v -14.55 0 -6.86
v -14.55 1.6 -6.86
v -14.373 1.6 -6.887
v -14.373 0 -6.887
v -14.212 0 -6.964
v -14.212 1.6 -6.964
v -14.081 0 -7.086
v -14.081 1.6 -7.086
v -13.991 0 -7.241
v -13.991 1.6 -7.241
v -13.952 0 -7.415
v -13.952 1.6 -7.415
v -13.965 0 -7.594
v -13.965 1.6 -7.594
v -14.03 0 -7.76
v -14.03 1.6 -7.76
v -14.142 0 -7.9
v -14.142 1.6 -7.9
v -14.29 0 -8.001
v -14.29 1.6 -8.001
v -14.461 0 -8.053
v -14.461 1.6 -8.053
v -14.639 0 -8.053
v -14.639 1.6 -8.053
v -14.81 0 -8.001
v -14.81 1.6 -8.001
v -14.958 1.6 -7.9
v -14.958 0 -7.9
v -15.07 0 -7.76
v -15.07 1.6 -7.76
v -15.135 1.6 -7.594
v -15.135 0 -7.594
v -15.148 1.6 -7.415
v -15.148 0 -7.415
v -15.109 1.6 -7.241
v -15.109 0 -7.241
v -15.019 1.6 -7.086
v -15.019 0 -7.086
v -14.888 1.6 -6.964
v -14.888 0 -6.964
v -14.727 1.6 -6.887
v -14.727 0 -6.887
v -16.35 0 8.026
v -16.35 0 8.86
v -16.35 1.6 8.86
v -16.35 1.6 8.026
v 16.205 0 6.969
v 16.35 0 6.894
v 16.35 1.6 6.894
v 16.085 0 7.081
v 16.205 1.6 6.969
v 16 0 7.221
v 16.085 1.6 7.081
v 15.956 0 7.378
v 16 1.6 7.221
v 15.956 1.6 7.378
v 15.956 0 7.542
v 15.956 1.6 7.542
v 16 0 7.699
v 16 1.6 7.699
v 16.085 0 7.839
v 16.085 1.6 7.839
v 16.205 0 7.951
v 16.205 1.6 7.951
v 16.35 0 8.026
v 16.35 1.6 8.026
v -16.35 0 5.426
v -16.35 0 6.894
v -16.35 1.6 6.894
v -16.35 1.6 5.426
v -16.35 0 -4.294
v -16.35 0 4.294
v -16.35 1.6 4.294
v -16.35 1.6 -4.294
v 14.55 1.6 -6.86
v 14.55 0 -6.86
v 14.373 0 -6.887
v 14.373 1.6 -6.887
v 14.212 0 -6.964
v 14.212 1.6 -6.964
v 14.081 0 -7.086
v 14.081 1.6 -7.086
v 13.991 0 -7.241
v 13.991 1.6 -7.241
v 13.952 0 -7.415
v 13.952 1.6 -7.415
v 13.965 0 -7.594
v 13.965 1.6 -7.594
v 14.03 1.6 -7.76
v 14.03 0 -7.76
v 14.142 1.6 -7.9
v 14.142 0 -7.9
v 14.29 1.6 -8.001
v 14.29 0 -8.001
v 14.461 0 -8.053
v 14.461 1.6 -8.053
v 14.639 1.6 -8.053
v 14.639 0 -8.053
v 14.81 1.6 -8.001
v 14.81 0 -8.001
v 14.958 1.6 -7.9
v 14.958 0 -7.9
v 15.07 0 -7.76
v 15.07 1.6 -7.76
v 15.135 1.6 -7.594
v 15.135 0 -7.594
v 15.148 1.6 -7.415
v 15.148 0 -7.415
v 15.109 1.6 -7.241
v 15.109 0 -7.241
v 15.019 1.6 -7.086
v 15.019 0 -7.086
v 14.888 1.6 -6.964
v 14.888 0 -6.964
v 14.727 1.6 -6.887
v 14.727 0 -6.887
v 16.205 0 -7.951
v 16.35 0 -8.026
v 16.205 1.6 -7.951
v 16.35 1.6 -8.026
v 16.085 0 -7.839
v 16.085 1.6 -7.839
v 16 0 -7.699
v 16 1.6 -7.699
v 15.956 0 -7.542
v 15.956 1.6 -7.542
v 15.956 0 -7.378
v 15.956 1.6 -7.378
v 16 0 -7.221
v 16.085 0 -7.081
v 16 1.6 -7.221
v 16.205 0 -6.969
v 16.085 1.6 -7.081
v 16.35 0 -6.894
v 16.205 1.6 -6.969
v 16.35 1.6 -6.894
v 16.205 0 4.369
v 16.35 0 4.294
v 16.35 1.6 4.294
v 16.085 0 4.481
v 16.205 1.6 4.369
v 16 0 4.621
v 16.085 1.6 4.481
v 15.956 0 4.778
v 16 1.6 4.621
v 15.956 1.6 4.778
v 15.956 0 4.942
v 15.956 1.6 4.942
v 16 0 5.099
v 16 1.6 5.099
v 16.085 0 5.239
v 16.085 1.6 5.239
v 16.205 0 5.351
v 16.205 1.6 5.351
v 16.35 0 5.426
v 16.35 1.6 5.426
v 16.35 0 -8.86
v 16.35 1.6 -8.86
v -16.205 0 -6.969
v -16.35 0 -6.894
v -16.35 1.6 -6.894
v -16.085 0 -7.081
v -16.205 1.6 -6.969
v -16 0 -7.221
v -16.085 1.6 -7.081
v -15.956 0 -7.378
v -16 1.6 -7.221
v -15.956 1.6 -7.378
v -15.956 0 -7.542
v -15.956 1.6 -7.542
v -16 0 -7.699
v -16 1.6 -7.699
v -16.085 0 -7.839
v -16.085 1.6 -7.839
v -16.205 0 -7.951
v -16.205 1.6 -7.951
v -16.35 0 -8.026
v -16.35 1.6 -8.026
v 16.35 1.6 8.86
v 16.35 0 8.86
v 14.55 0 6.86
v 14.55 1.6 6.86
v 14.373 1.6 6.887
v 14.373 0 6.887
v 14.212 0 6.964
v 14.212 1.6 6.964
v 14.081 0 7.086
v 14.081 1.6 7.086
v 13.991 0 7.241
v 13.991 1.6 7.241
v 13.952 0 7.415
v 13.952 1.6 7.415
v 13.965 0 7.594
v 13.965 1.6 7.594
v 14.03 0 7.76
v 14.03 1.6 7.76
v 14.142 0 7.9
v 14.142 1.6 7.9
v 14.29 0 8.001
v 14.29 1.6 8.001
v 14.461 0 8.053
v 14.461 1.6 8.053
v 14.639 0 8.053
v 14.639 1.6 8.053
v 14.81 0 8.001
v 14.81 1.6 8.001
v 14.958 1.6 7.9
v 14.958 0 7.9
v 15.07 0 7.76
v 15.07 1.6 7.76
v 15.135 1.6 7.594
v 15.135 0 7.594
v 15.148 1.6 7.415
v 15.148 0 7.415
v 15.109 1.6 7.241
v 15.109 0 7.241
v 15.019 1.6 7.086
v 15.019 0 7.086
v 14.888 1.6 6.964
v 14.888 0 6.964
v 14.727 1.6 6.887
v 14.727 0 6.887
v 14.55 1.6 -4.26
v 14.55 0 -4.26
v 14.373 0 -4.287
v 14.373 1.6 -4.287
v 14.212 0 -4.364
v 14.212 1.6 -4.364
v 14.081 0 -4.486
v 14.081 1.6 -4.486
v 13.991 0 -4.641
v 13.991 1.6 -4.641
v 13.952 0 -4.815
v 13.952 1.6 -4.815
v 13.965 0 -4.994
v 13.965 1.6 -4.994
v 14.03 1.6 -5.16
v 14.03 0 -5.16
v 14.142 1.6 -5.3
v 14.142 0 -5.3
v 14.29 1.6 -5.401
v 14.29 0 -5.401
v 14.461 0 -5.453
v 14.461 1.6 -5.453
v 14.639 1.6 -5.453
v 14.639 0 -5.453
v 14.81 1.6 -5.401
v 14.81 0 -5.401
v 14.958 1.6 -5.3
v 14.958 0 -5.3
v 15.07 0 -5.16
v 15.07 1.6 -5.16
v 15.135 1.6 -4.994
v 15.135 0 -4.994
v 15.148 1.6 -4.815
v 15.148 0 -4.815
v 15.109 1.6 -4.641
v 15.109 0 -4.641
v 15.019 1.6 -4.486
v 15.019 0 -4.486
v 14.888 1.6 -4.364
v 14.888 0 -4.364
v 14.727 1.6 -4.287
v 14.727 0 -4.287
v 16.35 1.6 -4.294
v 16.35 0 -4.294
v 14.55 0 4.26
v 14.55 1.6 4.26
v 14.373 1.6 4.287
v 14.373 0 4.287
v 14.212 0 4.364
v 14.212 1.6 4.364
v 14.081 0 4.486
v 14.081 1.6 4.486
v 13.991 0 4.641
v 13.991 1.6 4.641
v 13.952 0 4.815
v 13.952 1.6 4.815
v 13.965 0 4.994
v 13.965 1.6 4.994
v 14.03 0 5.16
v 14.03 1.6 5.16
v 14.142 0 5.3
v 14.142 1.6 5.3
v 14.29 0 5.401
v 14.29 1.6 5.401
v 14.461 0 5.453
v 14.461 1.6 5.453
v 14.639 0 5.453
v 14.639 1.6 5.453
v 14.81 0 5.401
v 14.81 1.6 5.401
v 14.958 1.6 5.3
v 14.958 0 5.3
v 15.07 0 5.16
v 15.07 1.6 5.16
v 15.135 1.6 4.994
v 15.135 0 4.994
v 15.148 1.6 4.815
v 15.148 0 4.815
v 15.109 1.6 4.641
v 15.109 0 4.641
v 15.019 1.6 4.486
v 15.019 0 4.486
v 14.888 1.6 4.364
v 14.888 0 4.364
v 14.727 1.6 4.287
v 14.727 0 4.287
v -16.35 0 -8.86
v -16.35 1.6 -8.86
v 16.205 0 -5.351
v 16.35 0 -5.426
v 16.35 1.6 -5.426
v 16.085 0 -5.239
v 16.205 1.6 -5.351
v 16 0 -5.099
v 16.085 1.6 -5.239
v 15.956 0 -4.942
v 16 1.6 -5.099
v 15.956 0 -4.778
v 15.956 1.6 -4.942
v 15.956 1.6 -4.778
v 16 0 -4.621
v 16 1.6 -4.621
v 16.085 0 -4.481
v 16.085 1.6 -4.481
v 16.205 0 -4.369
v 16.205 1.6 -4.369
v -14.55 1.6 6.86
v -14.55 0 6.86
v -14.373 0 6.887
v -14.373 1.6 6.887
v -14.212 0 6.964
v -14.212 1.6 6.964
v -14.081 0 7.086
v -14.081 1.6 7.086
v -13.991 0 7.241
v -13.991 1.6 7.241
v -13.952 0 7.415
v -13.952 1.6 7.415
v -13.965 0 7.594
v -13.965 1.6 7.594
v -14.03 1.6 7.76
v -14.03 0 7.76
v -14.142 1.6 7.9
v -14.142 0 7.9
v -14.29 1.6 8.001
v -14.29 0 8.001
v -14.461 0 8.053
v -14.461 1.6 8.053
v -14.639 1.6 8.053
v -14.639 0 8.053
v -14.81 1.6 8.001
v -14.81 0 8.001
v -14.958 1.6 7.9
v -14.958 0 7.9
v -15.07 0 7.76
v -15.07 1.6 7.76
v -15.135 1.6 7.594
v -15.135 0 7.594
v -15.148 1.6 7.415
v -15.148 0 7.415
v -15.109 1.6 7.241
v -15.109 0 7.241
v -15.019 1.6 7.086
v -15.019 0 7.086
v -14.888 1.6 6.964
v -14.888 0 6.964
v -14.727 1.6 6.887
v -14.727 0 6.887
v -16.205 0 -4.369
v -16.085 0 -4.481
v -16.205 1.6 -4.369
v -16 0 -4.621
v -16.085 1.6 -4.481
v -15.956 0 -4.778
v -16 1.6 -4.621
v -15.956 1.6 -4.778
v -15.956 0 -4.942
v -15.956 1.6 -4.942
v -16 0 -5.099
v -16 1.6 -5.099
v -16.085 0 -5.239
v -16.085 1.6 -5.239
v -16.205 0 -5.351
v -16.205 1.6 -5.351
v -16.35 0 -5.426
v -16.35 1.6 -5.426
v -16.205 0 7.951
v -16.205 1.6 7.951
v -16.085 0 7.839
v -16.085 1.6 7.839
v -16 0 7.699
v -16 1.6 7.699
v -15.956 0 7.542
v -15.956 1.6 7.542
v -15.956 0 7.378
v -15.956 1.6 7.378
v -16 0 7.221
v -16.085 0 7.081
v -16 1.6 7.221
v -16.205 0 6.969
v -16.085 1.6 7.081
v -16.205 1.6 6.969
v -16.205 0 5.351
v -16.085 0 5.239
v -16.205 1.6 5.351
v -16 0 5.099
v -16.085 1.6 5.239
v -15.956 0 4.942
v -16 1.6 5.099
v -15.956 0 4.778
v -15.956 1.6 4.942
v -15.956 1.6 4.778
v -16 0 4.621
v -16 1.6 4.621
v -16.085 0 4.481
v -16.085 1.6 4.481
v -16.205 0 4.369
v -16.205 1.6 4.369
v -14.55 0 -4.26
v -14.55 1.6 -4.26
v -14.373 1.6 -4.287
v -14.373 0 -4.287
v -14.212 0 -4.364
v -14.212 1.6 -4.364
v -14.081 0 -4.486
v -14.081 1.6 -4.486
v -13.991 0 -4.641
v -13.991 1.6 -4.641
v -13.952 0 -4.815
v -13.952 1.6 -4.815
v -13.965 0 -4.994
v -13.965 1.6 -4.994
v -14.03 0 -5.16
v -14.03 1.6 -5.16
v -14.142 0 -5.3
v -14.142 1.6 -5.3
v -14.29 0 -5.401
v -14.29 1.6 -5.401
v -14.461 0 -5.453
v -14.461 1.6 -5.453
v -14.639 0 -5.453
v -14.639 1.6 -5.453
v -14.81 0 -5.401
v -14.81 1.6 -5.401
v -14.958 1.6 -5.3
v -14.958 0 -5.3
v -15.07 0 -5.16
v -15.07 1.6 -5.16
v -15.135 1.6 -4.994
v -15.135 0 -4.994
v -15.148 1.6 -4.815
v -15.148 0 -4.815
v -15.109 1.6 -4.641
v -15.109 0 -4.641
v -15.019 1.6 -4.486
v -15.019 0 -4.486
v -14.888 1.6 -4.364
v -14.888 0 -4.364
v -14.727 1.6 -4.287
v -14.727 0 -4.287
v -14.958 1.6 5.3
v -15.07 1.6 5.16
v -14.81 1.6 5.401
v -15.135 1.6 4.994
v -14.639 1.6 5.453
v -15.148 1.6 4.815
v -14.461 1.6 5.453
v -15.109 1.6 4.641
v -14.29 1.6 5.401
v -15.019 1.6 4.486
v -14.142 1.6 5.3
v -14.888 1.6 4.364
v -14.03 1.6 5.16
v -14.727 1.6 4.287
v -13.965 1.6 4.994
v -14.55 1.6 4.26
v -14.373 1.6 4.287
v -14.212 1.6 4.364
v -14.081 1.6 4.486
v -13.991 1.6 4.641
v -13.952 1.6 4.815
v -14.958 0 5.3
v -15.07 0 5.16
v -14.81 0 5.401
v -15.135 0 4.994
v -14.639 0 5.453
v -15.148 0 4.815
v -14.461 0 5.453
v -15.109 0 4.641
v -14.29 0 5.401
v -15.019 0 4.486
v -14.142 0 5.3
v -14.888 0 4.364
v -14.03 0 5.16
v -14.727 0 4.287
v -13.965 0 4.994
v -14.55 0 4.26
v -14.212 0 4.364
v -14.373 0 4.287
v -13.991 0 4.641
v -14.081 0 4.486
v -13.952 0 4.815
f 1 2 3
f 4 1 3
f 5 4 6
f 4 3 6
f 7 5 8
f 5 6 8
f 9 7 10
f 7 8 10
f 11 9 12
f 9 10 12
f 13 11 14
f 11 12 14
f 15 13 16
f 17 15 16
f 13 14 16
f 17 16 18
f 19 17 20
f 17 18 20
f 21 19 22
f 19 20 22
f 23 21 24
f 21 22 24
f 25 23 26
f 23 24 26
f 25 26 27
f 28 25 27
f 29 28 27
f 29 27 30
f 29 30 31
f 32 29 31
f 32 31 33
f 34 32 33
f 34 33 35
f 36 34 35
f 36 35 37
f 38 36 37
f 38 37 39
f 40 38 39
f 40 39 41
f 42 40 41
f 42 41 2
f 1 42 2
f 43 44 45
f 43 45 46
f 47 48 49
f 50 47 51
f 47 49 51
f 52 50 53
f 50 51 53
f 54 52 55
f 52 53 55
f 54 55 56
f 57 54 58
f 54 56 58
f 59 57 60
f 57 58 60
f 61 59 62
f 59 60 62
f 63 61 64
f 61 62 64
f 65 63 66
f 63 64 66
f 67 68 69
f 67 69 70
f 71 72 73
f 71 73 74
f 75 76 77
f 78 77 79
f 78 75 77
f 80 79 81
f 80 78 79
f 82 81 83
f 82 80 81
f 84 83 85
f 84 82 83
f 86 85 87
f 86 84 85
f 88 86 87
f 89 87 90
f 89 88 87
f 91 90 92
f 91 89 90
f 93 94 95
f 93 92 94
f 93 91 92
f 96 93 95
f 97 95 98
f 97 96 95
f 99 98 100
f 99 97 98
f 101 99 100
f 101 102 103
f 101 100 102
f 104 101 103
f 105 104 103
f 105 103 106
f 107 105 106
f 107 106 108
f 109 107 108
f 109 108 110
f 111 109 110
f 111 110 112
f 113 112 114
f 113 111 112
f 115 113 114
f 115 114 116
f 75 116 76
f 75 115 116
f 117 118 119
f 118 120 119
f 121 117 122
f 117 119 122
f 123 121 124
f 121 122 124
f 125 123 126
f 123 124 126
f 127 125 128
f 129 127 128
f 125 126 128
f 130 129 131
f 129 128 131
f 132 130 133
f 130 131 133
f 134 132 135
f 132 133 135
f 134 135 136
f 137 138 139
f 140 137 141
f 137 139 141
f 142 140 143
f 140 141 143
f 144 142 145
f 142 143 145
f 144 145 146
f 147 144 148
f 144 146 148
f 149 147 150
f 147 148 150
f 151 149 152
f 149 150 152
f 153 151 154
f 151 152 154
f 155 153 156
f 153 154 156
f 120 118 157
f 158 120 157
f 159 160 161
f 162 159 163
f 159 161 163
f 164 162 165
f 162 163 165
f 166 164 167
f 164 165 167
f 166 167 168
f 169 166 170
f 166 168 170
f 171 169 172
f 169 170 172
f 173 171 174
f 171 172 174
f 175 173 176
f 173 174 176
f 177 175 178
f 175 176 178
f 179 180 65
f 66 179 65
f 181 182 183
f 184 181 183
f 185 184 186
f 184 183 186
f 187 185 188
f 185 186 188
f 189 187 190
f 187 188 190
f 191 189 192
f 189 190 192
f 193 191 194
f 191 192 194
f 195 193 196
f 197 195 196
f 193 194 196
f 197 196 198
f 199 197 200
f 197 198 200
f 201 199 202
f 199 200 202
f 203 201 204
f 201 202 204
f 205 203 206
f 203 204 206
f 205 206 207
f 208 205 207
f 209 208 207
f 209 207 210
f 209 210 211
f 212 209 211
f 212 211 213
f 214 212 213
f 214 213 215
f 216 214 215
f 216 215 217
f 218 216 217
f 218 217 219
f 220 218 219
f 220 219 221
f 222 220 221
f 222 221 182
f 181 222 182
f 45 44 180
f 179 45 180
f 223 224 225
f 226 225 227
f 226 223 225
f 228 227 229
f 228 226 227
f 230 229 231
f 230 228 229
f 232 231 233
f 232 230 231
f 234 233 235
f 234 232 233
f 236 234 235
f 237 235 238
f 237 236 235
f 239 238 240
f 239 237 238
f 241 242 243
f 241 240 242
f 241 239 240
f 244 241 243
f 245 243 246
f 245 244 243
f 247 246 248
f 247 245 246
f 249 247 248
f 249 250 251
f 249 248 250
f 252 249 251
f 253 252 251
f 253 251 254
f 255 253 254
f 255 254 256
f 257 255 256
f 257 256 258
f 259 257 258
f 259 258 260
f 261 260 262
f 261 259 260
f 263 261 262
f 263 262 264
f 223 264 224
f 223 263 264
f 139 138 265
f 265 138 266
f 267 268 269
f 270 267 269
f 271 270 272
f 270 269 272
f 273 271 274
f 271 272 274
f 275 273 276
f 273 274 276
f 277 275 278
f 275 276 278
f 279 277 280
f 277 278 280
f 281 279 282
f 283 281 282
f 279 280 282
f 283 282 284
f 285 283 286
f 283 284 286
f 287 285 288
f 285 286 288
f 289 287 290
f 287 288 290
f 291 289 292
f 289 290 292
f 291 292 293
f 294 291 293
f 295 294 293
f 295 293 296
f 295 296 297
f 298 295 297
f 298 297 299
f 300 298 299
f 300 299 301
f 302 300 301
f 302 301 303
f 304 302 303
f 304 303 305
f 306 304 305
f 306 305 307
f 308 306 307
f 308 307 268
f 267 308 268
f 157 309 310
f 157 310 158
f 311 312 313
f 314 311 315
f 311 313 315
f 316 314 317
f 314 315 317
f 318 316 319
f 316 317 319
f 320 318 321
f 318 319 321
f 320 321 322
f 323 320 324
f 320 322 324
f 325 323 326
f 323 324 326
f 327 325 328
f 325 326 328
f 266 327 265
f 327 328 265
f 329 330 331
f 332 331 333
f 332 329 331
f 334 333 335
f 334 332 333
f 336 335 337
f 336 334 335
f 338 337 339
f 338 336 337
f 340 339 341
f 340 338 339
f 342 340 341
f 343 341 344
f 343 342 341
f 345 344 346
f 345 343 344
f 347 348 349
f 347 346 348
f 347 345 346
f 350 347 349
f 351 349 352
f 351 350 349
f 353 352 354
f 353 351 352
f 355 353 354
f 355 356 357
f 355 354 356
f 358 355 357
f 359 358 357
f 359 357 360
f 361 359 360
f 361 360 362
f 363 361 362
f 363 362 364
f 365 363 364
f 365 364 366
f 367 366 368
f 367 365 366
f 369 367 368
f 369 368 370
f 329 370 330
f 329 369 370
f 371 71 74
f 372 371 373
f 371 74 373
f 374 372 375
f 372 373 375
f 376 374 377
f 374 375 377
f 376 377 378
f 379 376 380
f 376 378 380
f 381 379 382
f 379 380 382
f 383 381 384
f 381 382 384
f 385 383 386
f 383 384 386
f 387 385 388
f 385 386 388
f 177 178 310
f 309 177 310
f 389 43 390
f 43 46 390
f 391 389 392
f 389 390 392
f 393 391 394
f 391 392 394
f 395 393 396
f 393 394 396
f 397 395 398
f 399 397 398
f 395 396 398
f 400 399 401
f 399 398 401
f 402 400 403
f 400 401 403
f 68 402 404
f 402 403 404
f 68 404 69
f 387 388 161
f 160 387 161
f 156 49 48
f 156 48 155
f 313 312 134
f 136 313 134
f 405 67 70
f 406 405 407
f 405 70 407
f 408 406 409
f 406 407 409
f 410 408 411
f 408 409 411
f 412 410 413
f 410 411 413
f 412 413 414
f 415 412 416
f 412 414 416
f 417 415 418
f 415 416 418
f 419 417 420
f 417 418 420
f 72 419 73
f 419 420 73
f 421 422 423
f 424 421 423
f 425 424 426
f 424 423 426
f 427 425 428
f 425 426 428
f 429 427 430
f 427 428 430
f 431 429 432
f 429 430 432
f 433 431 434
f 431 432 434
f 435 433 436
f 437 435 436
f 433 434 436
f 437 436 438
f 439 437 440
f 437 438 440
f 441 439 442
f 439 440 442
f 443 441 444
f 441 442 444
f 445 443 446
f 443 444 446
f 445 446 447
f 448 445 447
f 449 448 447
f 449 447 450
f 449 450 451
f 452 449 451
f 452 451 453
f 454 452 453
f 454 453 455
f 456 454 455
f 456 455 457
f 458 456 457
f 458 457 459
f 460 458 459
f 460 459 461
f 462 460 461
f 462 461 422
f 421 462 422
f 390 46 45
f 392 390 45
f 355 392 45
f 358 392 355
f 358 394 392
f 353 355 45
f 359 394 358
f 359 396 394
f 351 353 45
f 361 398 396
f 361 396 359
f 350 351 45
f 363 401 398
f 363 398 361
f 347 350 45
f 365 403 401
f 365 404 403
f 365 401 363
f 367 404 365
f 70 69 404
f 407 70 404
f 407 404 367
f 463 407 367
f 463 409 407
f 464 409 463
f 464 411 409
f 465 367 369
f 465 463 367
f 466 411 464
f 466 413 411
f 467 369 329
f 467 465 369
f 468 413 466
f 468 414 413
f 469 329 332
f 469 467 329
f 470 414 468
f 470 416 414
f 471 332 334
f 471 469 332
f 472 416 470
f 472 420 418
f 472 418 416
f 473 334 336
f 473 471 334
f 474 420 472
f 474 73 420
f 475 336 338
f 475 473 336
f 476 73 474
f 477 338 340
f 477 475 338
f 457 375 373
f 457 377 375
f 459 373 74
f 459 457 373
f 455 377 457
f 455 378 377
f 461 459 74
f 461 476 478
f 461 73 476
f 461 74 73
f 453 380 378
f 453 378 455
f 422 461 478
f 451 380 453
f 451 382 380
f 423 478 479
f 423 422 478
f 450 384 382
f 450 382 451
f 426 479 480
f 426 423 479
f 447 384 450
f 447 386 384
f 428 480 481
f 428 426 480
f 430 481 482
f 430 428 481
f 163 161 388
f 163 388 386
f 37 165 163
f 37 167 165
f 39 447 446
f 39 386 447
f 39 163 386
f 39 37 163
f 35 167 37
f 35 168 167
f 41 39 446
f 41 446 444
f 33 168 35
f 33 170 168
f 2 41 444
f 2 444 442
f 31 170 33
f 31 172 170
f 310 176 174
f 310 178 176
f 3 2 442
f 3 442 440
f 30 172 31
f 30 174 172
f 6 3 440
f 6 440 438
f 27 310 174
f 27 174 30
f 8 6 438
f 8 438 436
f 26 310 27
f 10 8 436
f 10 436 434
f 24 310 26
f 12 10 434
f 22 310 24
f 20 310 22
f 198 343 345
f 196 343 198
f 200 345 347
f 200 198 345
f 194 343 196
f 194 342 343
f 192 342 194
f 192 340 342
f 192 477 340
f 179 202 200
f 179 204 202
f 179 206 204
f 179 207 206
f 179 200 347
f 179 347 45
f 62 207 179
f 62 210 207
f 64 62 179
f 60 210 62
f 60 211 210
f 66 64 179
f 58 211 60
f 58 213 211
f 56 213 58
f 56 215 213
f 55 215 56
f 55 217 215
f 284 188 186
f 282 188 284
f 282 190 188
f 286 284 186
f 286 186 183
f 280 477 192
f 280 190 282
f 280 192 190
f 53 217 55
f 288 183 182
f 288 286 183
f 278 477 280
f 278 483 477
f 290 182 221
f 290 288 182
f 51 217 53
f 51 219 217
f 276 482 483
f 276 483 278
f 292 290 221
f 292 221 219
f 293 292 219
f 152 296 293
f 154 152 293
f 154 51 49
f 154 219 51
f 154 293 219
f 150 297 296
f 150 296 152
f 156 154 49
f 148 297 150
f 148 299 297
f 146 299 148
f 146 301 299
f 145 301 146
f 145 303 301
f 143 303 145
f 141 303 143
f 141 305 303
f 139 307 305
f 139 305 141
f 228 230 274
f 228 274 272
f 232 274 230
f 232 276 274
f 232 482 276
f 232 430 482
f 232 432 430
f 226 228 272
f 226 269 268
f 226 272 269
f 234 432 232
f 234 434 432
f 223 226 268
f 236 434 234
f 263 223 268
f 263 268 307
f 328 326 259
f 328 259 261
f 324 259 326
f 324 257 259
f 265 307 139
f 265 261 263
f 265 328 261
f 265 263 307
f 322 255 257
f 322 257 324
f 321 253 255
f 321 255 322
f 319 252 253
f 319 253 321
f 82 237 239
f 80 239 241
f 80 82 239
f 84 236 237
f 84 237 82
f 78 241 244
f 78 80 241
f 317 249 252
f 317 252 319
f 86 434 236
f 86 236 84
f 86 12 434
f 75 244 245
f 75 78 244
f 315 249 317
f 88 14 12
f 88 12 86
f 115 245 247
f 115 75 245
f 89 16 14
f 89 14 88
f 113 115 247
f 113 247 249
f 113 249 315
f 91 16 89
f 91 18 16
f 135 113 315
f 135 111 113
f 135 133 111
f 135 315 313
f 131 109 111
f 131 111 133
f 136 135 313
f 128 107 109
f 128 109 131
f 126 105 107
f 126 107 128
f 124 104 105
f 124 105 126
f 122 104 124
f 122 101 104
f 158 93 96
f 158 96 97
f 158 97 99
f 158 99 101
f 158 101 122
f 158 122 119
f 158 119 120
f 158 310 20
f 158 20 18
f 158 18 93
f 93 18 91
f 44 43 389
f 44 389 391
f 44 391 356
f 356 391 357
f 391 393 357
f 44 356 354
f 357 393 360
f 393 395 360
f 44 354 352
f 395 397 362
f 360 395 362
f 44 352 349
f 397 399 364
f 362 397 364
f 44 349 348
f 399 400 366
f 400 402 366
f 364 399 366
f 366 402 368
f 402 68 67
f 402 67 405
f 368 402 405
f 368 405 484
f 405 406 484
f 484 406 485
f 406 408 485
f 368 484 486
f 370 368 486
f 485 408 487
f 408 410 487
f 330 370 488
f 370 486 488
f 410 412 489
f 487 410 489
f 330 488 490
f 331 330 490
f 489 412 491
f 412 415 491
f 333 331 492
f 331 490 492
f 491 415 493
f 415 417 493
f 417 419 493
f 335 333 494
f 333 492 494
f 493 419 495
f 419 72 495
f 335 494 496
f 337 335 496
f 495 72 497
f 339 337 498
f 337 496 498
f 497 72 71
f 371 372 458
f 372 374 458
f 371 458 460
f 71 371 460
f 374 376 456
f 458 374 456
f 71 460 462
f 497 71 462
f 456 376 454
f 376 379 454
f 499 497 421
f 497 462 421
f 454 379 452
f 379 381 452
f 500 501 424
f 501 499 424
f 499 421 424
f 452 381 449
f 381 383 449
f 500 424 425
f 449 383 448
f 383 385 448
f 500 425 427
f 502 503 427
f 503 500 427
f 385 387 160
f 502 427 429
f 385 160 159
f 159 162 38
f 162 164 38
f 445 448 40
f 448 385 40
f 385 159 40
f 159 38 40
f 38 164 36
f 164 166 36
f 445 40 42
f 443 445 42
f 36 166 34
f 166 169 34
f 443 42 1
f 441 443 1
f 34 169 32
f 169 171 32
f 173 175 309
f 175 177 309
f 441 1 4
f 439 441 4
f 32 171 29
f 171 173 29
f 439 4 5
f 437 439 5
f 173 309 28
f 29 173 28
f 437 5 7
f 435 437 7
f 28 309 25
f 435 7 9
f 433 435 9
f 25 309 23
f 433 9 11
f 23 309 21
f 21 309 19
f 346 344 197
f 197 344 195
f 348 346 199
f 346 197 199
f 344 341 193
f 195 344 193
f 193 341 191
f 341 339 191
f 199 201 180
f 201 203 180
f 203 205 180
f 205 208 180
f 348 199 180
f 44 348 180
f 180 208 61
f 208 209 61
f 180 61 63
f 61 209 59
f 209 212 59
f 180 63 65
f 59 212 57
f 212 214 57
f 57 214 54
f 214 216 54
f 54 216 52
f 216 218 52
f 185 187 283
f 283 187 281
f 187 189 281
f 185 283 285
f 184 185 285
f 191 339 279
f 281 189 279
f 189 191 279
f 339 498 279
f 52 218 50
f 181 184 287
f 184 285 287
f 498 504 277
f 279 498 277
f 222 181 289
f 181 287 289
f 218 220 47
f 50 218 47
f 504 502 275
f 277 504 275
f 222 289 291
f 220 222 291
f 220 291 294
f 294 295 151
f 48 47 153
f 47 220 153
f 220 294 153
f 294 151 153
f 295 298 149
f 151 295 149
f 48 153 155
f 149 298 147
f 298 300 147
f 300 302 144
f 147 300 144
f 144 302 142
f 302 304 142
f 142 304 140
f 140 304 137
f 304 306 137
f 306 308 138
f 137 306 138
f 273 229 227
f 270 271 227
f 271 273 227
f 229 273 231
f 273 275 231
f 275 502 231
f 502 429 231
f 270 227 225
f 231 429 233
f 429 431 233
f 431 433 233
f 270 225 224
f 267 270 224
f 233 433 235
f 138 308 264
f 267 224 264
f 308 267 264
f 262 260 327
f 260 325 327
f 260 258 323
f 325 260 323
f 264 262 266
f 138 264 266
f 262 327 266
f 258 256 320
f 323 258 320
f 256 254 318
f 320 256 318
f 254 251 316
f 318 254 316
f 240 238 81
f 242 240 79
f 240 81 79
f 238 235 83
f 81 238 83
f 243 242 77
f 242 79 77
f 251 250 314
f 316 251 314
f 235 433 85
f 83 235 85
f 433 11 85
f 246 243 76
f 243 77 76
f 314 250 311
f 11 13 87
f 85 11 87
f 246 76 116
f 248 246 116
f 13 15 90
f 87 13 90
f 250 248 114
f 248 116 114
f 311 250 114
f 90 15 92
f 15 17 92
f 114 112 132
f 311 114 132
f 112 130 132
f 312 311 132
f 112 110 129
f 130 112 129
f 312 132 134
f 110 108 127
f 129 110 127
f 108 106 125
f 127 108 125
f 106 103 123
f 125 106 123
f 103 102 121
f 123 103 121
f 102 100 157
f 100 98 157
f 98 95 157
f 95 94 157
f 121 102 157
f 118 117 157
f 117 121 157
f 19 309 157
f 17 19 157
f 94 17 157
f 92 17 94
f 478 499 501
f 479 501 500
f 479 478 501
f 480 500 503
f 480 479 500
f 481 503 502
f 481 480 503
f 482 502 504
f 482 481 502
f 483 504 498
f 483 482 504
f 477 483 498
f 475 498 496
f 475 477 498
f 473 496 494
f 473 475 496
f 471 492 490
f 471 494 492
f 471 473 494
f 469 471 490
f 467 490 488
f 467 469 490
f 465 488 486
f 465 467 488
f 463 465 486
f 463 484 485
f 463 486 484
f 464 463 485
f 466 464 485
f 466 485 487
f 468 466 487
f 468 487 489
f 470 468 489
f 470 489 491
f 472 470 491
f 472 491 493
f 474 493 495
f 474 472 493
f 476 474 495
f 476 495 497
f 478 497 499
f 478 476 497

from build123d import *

# Parameters (mm, degrees)
SKETCH1_W                       = 32.7
SKETCH1_H                       = 17.72
MAIN_BODY_DEPTH                 = 1.6
SKETCH2_R                       = 0.6
SOLDERED_CONNECTION_HOLES_DEPTH = 19.664996651
LPATTERN1_COUNT                 = 2
LPATTERN1_PITCH                 = 2
MIRROR1_COPY_1_SKETCH_R         = 0.6
MIRROR1_COPY_1_DEPTH            = 19.664996651
MIRROR2_COPY_1_SKETCH_R         = 0.6
MIRROR2_COPY_1_DEPTH            = 19.664996651
MIRROR2_COPY_2_SKETCH_R         = 0.6
MIRROR2_COPY_2_DEPTH            = 19.664996651
MIRROR2_COPY_3_SKETCH_R         = 0.6
MIRROR2_COPY_3_DEPTH            = 19.664996651


with BuildPart() as part:
    # Sketch1 → MAIN BODY (new body)
    with BuildSketch(Plane(origin=(0, 0, 0), x_dir=(1, 0, 0), z_dir=(0, 1, 0))):
        Rectangle(SKETCH1_W, SKETCH1_H)
    extrude(amount=MAIN_BODY_DEPTH)

    # Sketch2 → SOLDERED CONNECTION HOLES (cut, through all)
    with BuildSketch(Plane(origin=(0, 1.6, 0), x_dir=(1, 0, 0), z_dir=(0, 1, 0))):
        with Locations(Location((-14.55, 7.46, 0), (0, 0, 270))):
            Circle(SKETCH2_R)
        with Locations(Location((-14.55, 4.86, 0), (0, 0, 270))):
            Circle(SKETCH2_R)
    soldered_connection_holes = extrude(amount=-SOLDERED_CONNECTION_HOLES_DEPTH, mode=Mode.SUBTRACT)

    # LPattern1: SOLDERED CONNECTION HOLES ×2
    with Locations(*[(-i * LPATTERN1_PITCH, 0, 0) for i in range(1, LPATTERN1_COUNT)]):
        add(soldered_connection_holes, mode=Mode.SUBTRACT)

    # Mirror1: SOLDERED CONNECTION HOLES across plane
    add(soldered_connection_holes.mirror(Plane(origin=(0, 0, 0), x_dir=(0, 0, 1), z_dir=(1, 0, 0))), mode=Mode.SUBTRACT)

    # Mirror1 copy 1 sketch → Mirror1 copy 1 (cut, through all)
    with BuildSketch(Plane(origin=(2, 1.6, 0), x_dir=(-1, 0, 0), z_dir=(0, 1, 0))):
        with Locations((-14.55, -7.46)):
            Circle(MIRROR1_COPY_1_SKETCH_R)
        with Locations((-14.55, -4.86)):
            Circle(MIRROR1_COPY_1_SKETCH_R)
    extrude(amount=-MIRROR1_COPY_1_DEPTH, mode=Mode.SUBTRACT)

    # Mirror2: SOLDERED CONNECTION HOLES across plane
    add(soldered_connection_holes.mirror(Plane.XY), mode=Mode.SUBTRACT)

    # Mirror2 copy 1 sketch → Mirror2 copy 1 (cut, through all)
    with BuildSketch(Plane(origin=(-2, 1.6, 0), x_dir=(1, 0, 0), z_dir=(0, 1, 0))):
        with Locations((-14.55, -7.46)):
            Circle(MIRROR2_COPY_1_SKETCH_R)
        with Locations((-14.55, -4.86)):
            Circle(MIRROR2_COPY_1_SKETCH_R)
    extrude(amount=-MIRROR2_COPY_1_DEPTH, mode=Mode.SUBTRACT)

    # Mirror2 copy 2 sketch → Mirror2 copy 2 (cut, through all)
    with BuildSketch(Plane(origin=(0, 1.6, 0), x_dir=(-1, 0, 0), z_dir=(0, 1, 0))):
        with Locations(Location((-14.55, 7.46, 0), (0, 0, 270))):
            Circle(MIRROR2_COPY_2_SKETCH_R)
        with Locations(Location((-14.55, 4.86, 0), (0, 0, 270))):
            Circle(MIRROR2_COPY_2_SKETCH_R)
    extrude(amount=-MIRROR2_COPY_2_DEPTH, mode=Mode.SUBTRACT)

    # Mirror2 copy 3 sketch → Mirror2 copy 3 (cut, through all)
    with BuildSketch(Plane(origin=(2, 1.6, 0), x_dir=(-1, 0, 0), z_dir=(0, 1, 0))):
        with Locations(Location((-14.55, 7.46, 0), (0, 0, 270))):
            Circle(MIRROR2_COPY_3_SKETCH_R)
        with Locations(Location((-14.55, 4.86, 0), (0, 0, 270))):
            Circle(MIRROR2_COPY_3_SKETCH_R)
    extrude(amount=-MIRROR2_COPY_3_DEPTH, mode=Mode.SUBTRACT)


solid = part.part
